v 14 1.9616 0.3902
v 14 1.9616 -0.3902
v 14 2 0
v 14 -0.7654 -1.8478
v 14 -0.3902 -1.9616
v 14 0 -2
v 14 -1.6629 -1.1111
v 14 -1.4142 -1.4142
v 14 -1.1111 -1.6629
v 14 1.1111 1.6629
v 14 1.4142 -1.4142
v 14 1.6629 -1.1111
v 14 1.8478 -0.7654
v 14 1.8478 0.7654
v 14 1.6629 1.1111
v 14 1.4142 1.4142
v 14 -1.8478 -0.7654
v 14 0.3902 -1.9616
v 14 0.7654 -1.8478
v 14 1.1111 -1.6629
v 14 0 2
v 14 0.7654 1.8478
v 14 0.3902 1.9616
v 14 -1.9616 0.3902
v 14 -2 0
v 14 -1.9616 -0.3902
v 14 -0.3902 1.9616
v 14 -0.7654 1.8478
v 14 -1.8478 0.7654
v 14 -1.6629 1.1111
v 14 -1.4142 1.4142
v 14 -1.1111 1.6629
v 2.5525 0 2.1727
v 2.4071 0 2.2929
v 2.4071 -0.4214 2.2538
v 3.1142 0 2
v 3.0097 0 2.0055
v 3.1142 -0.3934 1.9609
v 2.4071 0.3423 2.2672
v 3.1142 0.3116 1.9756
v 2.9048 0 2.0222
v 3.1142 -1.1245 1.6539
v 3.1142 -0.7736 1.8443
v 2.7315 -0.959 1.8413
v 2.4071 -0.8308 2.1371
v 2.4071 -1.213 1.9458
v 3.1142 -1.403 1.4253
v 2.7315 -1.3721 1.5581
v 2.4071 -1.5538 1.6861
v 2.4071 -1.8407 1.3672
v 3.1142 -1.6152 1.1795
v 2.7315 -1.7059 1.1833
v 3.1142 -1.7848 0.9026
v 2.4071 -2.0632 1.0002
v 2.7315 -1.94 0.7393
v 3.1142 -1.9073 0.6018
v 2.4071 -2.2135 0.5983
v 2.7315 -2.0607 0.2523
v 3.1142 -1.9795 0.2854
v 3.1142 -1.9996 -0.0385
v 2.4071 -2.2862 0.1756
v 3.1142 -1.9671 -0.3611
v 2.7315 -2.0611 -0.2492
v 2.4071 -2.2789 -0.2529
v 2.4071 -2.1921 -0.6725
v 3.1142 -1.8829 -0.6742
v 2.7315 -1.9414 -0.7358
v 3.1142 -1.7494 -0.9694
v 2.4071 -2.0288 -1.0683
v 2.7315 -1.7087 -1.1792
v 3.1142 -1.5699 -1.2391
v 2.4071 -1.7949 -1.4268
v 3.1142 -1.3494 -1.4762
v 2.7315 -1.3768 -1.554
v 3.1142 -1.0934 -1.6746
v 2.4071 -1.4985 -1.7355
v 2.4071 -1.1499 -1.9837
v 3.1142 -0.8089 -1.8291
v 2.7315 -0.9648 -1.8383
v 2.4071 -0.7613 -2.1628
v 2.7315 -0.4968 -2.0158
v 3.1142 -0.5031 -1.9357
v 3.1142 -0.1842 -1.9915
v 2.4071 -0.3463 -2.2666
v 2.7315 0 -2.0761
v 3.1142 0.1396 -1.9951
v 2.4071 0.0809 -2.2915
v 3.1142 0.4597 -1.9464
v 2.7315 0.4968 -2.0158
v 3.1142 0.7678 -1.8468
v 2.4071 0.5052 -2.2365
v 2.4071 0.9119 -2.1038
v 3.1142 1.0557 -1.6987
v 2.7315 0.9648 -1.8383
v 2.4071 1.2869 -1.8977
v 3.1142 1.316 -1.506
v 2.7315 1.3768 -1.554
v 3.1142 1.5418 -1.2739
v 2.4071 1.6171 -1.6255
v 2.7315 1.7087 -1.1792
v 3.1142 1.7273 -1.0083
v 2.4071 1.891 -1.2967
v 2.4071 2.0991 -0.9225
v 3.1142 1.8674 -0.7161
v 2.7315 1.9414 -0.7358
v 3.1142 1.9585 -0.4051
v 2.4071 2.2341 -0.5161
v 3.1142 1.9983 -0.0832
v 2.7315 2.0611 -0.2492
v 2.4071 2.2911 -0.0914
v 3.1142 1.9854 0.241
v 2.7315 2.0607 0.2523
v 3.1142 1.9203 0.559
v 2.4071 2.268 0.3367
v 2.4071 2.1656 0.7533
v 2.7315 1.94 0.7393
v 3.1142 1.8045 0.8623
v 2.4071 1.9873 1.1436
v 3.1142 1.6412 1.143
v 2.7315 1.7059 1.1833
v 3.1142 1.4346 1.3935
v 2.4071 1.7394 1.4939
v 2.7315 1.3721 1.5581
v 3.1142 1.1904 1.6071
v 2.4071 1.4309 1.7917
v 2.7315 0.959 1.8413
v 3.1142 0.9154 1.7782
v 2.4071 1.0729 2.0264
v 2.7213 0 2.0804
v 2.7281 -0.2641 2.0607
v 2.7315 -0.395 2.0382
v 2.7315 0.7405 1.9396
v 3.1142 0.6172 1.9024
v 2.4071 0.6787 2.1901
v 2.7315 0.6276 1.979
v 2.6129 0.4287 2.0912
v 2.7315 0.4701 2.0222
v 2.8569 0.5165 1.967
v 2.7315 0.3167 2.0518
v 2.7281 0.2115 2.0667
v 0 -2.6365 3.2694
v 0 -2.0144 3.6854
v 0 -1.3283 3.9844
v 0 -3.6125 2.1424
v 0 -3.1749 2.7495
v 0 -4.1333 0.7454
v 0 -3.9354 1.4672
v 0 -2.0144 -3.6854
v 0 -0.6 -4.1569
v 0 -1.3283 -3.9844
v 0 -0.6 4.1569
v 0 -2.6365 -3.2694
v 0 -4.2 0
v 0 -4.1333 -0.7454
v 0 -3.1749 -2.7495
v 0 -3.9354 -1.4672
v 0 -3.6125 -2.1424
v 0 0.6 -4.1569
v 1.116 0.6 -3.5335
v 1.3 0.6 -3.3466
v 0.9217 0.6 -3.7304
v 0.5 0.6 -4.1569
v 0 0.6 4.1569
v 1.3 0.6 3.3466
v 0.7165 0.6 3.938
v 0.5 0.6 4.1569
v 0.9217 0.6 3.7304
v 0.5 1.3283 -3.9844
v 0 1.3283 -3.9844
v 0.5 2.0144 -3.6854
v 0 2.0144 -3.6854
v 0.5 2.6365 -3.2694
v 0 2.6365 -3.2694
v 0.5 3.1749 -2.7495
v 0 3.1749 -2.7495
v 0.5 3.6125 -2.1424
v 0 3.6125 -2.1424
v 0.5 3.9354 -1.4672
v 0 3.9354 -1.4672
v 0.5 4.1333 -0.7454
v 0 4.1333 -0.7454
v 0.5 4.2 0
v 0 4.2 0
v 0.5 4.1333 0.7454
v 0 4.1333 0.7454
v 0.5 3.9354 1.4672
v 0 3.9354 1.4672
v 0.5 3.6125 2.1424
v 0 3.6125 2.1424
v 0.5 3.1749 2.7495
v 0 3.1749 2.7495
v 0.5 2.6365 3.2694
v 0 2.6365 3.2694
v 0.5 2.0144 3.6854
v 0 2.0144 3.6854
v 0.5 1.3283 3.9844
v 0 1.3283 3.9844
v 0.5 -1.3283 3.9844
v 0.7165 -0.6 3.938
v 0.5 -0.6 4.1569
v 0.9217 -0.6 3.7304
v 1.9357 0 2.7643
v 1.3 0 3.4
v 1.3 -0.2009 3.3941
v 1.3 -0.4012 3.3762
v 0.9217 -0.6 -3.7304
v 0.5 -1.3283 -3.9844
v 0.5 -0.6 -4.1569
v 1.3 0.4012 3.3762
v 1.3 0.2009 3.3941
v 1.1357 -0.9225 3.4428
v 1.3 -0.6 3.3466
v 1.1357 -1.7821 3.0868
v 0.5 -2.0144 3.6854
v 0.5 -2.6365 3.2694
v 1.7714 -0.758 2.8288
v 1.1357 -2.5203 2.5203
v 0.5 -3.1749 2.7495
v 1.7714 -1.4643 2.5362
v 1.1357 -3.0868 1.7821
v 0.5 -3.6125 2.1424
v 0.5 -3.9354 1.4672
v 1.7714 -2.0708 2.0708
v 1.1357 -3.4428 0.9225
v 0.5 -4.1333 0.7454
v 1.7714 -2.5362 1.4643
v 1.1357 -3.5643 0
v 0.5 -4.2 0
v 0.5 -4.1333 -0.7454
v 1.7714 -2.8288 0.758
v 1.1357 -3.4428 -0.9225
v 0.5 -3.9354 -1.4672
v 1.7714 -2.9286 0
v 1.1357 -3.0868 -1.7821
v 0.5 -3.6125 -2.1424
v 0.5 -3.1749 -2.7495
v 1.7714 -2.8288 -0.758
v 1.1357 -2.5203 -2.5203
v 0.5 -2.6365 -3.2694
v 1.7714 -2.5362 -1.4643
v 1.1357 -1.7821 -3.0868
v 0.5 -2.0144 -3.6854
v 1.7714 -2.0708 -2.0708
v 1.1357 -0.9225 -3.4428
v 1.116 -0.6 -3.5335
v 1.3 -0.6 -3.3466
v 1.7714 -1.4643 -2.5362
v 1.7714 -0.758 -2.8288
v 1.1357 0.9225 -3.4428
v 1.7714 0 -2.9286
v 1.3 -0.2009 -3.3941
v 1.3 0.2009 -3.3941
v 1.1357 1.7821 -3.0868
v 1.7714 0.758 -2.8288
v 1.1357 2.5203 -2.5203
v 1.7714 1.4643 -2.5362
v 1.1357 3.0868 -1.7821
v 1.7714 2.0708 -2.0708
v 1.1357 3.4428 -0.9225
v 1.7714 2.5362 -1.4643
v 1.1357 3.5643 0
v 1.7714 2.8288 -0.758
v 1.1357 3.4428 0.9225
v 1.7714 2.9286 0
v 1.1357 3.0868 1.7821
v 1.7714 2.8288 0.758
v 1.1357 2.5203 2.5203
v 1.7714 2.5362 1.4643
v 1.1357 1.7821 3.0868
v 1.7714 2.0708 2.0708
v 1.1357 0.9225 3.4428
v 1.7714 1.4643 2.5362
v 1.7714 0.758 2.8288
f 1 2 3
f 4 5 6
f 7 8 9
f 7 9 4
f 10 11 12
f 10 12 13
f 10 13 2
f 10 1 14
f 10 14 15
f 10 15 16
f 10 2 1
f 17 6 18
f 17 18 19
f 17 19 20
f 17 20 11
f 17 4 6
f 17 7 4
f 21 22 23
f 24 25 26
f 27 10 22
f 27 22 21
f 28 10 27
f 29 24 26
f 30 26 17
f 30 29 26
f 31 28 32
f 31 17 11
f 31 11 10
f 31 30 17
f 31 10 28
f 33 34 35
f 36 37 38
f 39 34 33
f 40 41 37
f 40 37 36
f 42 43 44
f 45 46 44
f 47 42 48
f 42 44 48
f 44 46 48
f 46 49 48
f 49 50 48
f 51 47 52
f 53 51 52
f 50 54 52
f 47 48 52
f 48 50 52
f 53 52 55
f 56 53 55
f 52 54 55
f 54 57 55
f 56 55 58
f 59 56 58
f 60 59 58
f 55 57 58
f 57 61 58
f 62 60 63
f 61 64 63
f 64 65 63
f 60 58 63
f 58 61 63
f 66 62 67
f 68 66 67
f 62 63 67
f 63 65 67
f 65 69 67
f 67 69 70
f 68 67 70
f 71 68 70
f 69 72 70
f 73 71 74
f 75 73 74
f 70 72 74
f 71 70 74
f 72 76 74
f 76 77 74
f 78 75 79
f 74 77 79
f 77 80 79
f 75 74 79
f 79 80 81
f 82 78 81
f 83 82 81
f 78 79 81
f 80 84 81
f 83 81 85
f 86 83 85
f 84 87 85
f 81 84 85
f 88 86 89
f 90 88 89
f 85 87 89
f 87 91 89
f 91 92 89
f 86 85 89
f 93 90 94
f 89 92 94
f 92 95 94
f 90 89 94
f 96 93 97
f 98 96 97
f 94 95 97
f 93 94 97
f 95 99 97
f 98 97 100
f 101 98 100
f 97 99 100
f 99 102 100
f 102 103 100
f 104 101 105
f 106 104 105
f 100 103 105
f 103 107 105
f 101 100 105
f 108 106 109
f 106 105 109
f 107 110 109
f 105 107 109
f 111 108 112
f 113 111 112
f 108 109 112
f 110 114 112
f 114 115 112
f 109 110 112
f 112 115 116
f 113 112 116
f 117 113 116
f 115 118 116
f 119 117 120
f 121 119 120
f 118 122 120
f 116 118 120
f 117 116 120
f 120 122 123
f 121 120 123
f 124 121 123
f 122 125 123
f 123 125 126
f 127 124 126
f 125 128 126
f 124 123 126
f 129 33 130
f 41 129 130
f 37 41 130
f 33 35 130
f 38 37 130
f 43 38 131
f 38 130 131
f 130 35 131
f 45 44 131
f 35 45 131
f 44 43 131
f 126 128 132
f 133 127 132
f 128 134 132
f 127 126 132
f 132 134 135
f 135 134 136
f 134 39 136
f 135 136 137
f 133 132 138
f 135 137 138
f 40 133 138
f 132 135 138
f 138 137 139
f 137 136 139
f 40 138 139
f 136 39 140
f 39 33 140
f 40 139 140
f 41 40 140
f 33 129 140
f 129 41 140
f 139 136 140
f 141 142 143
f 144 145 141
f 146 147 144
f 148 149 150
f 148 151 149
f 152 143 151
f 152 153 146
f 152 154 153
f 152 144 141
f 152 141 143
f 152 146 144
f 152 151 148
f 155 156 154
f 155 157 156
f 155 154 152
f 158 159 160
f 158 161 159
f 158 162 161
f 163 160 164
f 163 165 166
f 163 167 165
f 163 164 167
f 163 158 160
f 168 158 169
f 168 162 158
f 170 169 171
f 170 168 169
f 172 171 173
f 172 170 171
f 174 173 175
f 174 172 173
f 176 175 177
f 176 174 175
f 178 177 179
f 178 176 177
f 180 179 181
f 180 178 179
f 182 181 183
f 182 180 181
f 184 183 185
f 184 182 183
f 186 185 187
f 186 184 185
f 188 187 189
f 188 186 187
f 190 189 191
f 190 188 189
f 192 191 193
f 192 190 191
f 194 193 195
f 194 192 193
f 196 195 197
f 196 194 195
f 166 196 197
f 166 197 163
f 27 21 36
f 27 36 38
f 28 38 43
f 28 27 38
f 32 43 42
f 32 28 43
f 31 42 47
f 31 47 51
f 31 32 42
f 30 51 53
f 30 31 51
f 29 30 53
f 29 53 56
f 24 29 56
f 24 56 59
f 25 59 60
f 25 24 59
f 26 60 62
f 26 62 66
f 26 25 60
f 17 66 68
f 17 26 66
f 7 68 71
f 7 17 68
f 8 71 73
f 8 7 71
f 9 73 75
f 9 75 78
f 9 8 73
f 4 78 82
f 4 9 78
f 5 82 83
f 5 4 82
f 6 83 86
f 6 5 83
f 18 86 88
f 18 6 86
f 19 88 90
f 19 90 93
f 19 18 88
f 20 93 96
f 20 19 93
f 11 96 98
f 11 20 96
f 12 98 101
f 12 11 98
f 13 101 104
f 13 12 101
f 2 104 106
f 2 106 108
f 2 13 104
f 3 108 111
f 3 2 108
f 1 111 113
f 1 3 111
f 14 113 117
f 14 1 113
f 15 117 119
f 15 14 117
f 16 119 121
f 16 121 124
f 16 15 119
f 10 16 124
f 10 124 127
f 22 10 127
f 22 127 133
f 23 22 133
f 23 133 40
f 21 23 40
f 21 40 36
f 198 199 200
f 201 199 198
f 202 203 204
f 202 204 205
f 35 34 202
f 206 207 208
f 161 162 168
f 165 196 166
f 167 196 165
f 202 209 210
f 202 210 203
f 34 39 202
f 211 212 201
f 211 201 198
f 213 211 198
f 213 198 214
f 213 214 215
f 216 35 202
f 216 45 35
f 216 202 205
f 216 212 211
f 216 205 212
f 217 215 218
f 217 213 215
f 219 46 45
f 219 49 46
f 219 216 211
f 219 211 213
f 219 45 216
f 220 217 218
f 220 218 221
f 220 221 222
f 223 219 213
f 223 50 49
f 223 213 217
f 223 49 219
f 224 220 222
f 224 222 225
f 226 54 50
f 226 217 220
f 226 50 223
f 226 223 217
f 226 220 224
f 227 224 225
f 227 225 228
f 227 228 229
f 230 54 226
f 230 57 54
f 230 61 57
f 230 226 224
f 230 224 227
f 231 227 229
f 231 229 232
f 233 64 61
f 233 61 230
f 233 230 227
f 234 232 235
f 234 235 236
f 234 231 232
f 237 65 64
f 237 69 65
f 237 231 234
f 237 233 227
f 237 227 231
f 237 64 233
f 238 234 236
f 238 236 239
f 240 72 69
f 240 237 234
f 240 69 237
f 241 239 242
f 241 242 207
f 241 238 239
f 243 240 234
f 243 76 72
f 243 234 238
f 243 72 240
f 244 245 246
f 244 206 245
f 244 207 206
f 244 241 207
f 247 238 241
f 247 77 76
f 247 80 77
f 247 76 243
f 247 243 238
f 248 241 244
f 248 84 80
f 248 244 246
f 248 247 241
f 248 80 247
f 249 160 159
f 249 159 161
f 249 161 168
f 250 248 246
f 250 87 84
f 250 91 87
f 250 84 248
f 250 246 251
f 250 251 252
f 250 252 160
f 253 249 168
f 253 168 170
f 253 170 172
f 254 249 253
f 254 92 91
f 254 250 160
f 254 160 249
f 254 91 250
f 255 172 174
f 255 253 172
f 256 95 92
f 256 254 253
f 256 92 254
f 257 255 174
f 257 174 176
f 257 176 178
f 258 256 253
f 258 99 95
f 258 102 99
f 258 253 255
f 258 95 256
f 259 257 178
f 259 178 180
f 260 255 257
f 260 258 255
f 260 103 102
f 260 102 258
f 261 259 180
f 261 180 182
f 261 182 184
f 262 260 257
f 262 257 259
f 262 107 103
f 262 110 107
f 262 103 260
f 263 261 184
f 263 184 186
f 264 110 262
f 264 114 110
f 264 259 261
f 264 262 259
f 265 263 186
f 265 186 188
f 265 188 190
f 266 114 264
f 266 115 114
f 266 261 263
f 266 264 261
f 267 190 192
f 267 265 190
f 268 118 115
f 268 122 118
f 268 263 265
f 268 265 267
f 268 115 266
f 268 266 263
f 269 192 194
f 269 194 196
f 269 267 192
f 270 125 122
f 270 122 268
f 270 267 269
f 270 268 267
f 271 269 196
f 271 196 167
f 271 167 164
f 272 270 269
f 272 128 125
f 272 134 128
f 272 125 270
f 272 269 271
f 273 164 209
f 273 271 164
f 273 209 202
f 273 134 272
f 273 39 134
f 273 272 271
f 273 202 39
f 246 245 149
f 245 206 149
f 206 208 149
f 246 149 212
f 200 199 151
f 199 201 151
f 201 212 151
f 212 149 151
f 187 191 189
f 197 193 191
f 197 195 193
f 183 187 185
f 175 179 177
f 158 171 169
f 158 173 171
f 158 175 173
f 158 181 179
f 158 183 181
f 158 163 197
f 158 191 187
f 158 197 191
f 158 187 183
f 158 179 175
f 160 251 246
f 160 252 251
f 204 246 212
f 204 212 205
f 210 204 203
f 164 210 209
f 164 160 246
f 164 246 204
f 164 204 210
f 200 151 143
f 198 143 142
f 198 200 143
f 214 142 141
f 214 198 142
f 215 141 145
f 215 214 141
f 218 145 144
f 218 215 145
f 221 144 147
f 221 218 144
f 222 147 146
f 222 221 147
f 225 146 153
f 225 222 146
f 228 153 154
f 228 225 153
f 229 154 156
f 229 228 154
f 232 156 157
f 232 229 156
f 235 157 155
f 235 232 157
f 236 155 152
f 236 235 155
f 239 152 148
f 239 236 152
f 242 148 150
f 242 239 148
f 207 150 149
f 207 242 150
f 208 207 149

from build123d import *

# Parameters (mm, degrees)
FILLET1_R  = 1
SKETCH2_W  = 8.4
SKETCH2_H  = 1.2
SLOT_DEPTH = 1.3


with BuildPart() as part:
    # BodySke → Base-Revolve (revolve)
    with BuildSketch(Plane.XY, mode=Mode.PRIVATE) as base_revolve_sk:
        Polygon((0, 0), (0, 4.2), (0.5, 4.2), (2.7, 2), (14, 2), (14, 0), align=None)
    revolve(base_revolve_sk.sketch.rotate(Axis((-6.35, 0, 0), (1, 0, 0)), 90), axis=Axis((-6.35, 0, 0), (1, 0, 0)))  # turned: the seam where the file's is

    # Fillet1
    fillet1_edges = [part.edges().sort_by_distance(p)[0] for p in [
        (2.7, 0, -2),
    ]]
    fillet(fillet1_edges, radius=FILLET1_R)

    # Sketch2 → Slot (cut)
    with BuildSketch(Plane.ZY):
        Rectangle(SKETCH2_W, SKETCH2_H)
    extrude(amount=-SLOT_DEPTH, mode=Mode.SUBTRACT)


solid = part.part
